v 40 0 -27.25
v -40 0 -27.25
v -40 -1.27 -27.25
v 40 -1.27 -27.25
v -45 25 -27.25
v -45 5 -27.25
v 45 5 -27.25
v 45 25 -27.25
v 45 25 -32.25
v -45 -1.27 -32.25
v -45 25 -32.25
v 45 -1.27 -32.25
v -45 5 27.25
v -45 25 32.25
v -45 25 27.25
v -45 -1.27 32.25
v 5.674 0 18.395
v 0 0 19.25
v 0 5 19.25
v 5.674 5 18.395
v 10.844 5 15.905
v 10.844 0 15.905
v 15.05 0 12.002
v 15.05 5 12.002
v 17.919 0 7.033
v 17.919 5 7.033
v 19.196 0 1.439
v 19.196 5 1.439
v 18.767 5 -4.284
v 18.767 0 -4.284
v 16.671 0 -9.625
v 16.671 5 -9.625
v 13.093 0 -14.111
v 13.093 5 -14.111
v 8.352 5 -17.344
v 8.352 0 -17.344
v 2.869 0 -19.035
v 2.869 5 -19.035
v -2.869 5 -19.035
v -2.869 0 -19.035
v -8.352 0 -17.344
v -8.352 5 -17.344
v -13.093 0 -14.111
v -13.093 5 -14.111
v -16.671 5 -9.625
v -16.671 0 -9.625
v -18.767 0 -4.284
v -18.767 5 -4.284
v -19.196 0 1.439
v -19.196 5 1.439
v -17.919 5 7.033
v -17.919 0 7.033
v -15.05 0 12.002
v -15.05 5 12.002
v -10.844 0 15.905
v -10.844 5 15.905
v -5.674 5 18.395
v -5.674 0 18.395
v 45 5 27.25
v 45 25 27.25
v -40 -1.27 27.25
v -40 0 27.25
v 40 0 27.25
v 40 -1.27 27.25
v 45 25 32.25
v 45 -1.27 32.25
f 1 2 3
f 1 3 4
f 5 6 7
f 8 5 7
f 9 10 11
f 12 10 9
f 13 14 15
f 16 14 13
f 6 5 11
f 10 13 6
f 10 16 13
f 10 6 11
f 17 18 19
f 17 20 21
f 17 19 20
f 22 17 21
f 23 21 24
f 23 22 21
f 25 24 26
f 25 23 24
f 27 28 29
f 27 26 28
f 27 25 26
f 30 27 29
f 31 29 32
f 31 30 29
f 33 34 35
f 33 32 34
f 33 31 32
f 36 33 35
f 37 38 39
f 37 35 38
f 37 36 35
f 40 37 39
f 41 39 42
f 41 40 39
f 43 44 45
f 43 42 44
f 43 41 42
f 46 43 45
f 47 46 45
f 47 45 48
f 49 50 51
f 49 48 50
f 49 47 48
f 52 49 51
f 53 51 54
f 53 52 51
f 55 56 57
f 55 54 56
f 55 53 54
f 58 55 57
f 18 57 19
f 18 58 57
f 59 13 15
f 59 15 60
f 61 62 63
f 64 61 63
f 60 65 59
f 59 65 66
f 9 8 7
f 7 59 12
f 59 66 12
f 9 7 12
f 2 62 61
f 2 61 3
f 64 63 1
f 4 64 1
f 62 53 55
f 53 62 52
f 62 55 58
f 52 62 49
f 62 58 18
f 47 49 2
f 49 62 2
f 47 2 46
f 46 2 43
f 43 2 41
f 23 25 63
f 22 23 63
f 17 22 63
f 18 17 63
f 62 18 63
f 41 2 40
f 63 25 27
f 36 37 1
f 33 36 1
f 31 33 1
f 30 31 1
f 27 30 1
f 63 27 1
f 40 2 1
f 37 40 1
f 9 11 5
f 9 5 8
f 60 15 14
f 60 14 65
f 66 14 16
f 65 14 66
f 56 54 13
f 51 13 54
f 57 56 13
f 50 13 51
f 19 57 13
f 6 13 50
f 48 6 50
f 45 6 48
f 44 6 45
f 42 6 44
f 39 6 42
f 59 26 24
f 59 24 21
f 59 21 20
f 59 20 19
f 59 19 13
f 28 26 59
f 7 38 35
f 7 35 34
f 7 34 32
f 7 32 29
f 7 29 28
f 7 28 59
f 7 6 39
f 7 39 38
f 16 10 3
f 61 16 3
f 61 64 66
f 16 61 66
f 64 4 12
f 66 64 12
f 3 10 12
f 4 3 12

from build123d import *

# Parameters (mm, degrees)
SKETCH1_W               = 80
SKETCH1_H               = 54.5
BOSS_EXTRUDE1_DEPTH     = 1.27
SHELL4_T                = 5
SKETCH7_W               = 90
SKETCH7_H               = 5
BOSS_EXTRUDE4_DEPTH     = 20
CUT_EXTRUDE3_DEPTH      = 61.745884634
CUT_EXTRUDE3_DEPTH_BACK = 61.745884634
SKETCH1_5_R             = 19.25


with BuildPart() as part:
    # Sketch1 → Boss-Extrude1 (new body)
    with BuildSketch(Plane(origin=(0, 0, 0), x_dir=(1, 0, 0), z_dir=(0, 1, 0))):
        Rectangle(SKETCH1_W, SKETCH1_H)
    extrude(amount=-BOSS_EXTRUDE1_DEPTH)

    # Shell4
    shell4_openings = [part.faces().sort_by_distance(p)[0] for p in [
        (0, -1.27, 0),
    ]]
    offset(amount=SHELL4_T, openings=shell4_openings, kind=Kind.INTERSECTION)

    # Sketch7 → Boss-Extrude4 (add)
    with BuildSketch(Plane(origin=(0, 5, 0), x_dir=(1, 0, 0), z_dir=(0, 1, 0))):
        with Locations((0, 29.75)):
            Rectangle(SKETCH7_W, SKETCH7_H)
        with Locations((0, -29.75)):
            Rectangle(SKETCH7_W, SKETCH7_H)
    extrude(amount=BOSS_EXTRUDE4_DEPTH)

    # Sketch1<5> → Cut-Extrude3 (cut, two sides: drawn at the far end of the back side and taken through both)
    with BuildSketch(Plane(origin=(0, 0, 0), x_dir=(1, 0, 0), z_dir=(0, 1, 0)).offset(-CUT_EXTRUDE3_DEPTH_BACK)):
        Circle(SKETCH1_5_R)
    extrude(amount=CUT_EXTRUDE3_DEPTH + CUT_EXTRUDE3_DEPTH_BACK, mode=Mode.SUBTRACT)


solid = part.part
